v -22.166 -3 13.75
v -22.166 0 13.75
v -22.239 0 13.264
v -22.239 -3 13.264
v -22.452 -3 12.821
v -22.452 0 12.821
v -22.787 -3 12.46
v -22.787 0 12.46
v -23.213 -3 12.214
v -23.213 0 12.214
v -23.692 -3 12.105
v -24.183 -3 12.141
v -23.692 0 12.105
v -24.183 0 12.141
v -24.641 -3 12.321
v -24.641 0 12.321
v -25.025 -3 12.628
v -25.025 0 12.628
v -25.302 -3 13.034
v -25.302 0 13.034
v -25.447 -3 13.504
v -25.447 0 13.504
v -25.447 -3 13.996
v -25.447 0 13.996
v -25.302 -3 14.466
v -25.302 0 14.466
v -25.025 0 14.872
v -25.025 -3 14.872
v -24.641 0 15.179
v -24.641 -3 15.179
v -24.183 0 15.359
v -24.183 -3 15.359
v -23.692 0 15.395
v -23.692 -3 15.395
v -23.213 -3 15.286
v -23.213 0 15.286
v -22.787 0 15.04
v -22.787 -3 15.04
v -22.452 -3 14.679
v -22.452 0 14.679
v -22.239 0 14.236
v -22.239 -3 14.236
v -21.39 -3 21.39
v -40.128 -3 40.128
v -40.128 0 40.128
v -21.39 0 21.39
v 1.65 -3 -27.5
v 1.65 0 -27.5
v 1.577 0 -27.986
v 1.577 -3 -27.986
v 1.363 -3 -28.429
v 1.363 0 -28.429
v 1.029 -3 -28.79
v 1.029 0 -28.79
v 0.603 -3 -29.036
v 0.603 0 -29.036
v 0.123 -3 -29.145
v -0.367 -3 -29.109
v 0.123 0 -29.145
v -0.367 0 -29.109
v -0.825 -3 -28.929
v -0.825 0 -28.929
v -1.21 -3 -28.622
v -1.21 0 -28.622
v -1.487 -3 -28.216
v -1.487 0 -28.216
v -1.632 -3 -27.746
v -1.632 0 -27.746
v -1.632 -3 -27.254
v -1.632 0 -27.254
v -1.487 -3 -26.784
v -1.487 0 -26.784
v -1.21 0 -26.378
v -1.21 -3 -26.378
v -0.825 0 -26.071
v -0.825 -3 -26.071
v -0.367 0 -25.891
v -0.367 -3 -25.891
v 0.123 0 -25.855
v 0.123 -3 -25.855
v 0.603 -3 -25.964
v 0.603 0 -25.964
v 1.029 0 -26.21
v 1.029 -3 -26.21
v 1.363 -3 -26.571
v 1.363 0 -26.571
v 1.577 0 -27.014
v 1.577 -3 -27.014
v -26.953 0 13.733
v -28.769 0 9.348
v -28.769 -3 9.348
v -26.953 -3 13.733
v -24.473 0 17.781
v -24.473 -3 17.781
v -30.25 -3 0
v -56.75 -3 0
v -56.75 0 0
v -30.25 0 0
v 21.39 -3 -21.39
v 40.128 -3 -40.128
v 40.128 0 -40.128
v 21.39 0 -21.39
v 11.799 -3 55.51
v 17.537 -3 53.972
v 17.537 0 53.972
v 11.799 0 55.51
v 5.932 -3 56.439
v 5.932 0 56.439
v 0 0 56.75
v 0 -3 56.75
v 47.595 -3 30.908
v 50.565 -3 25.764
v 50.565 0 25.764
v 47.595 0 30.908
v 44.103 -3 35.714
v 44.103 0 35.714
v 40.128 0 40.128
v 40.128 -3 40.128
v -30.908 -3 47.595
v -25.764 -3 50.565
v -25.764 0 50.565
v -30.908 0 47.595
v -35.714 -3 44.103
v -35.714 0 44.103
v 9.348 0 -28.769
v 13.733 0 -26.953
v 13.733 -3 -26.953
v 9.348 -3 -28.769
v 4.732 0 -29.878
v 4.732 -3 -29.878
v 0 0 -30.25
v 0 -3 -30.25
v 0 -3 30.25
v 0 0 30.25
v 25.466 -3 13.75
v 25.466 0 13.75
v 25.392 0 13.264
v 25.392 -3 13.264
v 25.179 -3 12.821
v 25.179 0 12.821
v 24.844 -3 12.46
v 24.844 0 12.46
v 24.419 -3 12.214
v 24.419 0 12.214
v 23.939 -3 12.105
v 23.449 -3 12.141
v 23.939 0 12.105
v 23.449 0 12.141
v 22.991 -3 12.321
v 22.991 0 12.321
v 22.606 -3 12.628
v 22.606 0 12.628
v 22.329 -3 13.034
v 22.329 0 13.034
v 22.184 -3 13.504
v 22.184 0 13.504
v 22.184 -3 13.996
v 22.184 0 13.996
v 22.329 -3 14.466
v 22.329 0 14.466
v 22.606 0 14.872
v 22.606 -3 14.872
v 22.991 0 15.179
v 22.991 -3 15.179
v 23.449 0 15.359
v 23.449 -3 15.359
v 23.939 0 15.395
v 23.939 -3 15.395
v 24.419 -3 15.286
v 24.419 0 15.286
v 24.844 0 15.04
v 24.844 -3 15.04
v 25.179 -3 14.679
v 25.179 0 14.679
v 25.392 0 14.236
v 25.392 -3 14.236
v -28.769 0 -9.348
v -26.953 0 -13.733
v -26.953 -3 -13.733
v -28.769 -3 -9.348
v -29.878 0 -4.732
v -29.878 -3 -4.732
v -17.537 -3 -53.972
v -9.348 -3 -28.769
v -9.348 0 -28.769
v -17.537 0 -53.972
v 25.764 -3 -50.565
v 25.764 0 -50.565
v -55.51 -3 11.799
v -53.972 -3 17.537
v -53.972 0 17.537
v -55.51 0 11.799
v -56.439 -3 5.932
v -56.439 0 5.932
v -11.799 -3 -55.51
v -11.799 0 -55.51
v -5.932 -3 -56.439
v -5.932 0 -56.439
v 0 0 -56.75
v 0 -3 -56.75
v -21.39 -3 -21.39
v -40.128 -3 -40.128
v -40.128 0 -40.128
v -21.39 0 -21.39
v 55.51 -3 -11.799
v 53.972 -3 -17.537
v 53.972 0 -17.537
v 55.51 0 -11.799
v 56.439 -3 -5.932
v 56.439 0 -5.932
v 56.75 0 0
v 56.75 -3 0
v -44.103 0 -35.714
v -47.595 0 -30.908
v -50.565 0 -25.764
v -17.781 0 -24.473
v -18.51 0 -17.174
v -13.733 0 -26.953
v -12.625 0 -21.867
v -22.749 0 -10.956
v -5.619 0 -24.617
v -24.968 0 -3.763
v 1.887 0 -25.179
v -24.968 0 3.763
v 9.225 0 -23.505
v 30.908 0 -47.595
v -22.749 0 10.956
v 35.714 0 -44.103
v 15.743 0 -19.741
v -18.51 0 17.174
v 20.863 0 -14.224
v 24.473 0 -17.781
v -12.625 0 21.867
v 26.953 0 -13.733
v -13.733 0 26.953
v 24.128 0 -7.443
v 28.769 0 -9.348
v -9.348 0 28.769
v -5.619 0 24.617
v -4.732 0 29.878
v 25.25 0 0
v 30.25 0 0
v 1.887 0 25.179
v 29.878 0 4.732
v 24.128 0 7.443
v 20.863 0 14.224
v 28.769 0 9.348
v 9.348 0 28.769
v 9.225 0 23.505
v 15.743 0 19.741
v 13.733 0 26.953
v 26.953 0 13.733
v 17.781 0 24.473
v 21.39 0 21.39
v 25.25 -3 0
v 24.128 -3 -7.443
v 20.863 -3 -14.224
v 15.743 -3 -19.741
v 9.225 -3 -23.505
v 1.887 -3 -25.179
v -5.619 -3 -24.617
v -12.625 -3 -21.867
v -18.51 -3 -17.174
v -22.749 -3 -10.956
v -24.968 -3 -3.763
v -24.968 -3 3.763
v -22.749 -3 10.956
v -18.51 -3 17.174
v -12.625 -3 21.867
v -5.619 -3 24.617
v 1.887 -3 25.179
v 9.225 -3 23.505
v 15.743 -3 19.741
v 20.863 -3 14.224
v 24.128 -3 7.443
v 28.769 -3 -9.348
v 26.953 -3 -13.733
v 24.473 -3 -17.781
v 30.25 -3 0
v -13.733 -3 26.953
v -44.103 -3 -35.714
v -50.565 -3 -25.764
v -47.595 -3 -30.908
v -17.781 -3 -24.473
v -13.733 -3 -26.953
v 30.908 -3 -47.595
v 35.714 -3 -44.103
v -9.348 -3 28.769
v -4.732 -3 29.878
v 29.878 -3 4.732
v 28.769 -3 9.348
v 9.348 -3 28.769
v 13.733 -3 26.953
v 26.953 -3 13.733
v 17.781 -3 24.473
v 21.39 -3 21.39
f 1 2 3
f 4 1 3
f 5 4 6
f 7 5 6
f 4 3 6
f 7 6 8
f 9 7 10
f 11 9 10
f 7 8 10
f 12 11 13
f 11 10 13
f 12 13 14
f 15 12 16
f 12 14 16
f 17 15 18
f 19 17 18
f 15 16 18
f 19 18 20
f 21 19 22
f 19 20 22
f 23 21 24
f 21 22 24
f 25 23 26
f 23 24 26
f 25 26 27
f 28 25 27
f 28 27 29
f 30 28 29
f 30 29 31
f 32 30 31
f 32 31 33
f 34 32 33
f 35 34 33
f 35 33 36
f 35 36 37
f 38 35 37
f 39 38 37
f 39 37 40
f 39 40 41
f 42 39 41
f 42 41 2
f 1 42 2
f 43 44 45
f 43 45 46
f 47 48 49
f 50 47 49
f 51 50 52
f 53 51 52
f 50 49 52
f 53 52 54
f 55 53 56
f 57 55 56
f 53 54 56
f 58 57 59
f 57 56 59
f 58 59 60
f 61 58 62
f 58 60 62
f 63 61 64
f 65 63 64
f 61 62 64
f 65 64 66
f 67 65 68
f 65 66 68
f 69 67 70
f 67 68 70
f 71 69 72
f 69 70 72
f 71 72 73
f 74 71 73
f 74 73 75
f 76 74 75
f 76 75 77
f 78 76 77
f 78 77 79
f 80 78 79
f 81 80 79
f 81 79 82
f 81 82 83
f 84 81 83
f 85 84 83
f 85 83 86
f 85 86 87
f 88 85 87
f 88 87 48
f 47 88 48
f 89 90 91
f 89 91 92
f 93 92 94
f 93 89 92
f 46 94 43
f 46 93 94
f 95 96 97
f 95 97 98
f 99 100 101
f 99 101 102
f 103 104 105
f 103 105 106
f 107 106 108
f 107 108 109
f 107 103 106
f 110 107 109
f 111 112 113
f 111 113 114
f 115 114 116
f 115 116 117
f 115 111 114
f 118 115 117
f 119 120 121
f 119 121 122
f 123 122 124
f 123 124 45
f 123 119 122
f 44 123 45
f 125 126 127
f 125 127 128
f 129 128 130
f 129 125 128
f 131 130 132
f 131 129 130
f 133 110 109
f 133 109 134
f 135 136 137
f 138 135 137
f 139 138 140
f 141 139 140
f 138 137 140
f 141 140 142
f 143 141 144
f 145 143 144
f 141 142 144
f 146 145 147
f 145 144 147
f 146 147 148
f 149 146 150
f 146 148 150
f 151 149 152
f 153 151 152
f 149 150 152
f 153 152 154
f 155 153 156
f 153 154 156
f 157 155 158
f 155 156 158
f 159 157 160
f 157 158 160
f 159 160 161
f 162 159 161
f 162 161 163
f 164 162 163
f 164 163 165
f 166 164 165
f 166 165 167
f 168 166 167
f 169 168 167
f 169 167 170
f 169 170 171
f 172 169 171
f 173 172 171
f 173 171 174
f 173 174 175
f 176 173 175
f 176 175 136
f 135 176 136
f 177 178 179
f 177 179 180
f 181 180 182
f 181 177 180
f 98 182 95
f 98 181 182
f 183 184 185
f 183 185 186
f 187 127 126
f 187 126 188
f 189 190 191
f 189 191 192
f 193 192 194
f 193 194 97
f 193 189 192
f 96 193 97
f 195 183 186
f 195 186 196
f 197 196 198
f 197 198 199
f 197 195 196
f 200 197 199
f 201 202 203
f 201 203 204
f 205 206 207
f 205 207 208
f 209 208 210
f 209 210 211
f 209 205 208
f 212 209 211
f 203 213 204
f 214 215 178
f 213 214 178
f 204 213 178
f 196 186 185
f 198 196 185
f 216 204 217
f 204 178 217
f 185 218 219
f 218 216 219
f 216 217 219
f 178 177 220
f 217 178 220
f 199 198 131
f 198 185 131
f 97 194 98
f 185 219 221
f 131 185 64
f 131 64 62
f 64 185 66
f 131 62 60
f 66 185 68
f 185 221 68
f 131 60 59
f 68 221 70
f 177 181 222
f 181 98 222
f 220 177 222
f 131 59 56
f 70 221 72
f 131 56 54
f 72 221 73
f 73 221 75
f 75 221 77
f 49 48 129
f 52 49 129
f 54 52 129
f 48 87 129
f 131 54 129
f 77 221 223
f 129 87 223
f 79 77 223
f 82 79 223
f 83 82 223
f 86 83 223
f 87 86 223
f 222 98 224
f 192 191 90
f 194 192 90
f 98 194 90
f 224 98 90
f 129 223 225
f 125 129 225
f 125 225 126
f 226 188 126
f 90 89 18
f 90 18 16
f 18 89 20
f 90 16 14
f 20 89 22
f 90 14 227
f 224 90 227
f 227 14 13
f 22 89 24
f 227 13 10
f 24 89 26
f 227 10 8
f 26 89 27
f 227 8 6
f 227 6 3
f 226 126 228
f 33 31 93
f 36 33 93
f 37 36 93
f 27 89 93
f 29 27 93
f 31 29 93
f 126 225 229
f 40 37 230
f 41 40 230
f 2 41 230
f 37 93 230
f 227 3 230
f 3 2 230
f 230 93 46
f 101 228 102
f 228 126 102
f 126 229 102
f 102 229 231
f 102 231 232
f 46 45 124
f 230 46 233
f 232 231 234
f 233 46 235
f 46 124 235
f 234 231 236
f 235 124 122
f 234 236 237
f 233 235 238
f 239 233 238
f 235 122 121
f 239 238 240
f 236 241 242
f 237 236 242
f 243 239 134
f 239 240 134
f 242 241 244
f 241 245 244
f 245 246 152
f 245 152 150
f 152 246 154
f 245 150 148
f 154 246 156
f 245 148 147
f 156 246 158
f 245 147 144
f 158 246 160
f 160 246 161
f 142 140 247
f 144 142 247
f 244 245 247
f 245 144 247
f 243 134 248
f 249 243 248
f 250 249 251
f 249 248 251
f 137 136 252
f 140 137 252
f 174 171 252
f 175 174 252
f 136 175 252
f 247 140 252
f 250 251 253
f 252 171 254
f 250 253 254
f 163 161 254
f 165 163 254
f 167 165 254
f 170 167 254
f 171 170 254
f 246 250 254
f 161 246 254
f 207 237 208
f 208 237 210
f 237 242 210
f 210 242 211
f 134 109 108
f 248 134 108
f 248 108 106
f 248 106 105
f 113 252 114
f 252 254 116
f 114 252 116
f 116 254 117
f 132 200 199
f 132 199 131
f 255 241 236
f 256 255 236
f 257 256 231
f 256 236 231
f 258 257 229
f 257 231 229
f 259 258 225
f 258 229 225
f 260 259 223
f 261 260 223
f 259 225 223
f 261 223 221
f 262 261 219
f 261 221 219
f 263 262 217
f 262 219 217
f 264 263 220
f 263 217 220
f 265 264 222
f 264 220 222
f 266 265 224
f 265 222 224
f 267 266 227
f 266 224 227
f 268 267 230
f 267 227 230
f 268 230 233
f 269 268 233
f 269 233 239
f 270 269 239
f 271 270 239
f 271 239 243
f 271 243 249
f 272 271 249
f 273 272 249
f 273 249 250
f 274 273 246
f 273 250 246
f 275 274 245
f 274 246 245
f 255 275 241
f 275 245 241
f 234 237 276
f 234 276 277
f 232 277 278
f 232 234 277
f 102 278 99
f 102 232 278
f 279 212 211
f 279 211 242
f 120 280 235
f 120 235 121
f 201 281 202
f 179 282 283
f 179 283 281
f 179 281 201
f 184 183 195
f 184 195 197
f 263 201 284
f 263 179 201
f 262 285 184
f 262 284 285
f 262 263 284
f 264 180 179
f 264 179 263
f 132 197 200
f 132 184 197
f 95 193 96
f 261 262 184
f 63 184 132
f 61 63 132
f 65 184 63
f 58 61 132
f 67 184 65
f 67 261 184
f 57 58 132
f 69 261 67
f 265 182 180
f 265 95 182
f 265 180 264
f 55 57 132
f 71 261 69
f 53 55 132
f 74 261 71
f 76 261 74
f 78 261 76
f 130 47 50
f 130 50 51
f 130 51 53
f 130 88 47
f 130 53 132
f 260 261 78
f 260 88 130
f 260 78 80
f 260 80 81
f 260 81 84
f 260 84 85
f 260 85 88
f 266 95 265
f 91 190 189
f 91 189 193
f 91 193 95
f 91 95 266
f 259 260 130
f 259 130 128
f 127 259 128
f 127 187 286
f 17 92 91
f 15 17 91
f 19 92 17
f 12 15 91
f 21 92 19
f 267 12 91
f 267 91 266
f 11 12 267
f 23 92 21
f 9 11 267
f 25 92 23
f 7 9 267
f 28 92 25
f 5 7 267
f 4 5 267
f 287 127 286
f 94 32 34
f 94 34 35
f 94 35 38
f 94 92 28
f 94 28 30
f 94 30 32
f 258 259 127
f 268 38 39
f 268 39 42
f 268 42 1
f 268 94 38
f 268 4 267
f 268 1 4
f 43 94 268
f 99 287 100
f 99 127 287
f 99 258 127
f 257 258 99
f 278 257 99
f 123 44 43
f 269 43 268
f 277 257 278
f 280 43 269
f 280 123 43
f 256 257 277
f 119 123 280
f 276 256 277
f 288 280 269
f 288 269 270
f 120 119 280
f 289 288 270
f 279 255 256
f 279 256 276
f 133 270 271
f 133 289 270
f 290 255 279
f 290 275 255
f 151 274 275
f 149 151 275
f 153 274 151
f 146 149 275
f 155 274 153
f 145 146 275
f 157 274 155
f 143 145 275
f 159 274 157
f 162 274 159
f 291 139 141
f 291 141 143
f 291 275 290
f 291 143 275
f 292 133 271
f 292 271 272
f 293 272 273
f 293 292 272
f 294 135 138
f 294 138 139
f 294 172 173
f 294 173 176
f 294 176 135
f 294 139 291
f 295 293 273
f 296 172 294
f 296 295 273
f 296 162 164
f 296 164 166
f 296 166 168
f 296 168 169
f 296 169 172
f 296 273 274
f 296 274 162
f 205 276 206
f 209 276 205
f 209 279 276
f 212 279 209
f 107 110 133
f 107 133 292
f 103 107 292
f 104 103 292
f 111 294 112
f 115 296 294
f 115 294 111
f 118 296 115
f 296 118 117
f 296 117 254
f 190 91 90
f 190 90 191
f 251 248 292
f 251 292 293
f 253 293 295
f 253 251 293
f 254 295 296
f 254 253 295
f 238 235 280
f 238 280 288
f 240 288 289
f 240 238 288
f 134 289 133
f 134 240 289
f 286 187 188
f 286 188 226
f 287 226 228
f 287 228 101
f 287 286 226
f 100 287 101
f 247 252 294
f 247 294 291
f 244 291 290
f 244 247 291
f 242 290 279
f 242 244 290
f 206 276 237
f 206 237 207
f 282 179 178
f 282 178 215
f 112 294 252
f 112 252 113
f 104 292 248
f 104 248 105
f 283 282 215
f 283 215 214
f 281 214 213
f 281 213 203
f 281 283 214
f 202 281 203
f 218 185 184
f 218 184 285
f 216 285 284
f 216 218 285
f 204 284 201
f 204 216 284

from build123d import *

# Parameters (mm, degrees)
SKETCH1_R           = 30.25
SKETCH1_R_2         = 25.25
EXTRUDE_THIN1_DEPTH = 3
SKETCH2_R           = 1.65
CUT_EXTRUDE3_DEPTH  = 10
BOSS_EXTRUDE1_DEPTH = 3


with BuildPart() as part:
    # Sketch1 → Extrude-Thin1 (new body)
    with BuildSketch(Plane(origin=(0, 0, 0), x_dir=(1, 0, 0), z_dir=(0, 1, 0))):
        Circle(SKETCH1_R)
        Circle(SKETCH1_R_2, mode=Mode.SUBTRACT)
    extrude(amount=-EXTRUDE_THIN1_DEPTH)

    # Sketch2 → Cut-Extrude3 (cut)
    with BuildSketch(Plane(origin=(0, 0, 0), x_dir=(1, 0, 0), z_dir=(0, 1, 0))):
        with Locations((0, 27.5)):
            Circle(SKETCH2_R)
        with Locations((23.815698604, -13.75)):
            Circle(SKETCH2_R)
        with Locations((-23.815698604, -13.75)):
            Circle(SKETCH2_R)
    extrude(amount=-CUT_EXTRUDE3_DEPTH, mode=Mode.SUBTRACT)

    # Sketch5 → Boss-Extrude1 (add)
    with BuildSketch(Plane.XZ.offset(3)):
        with BuildLine():
            Line((0, 56.75), (0, 30.25))
            ThreePointArc((0, 30.25), (4.732142567, 29.877572303), (9.34776408, 28.769459618))
            Line((9.34776408, 28.769459618), (17.536714431, 53.9724573))
            ThreePointArc((17.536714431, 53.9724573), (8.877655891, 56.051313329), (0, 56.75))
        make_face()
        with BuildLine():
            Line((40.128309832, 40.128309832), (21.389980131, 21.389980131))
            ThreePointArc((21.389980131, 21.389980131), (24.47276408, 17.780503882), (26.952947357, 13.733212617))
            Line((26.952947357, 13.733212617), (50.564620248, 25.76396086))
            ThreePointArc((50.564620248, 25.76396086), (45.911714431, 33.356813068), (40.128309832, 40.128309832))
        make_face()
        with BuildLine():
            Line((56.75, 0), (30.25, 0))
            ThreePointArc((30.25, 0), (29.877572303, -4.732142567), (28.769459618, -9.34776408))
            Line((28.769459618, -9.34776408), (53.9724573, -17.536714431))
            ThreePointArc((53.9724573, -17.536714431), (56.051313329, -8.877655891), (56.75, 0))
        make_face()
        with BuildLine():
            Line((40.128309832, -40.128309832), (21.389980131, -21.389980131))
            ThreePointArc((21.389980131, -21.389980131), (17.780503882, -24.47276408), (13.733212617, -26.952947357))
            Line((13.733212617, -26.952947357), (25.76396086, -50.564620248))
            ThreePointArc((25.76396086, -50.564620248), (33.356813068, -45.911714431), (40.128309832, -40.128309832))
        make_face()
        with BuildLine():
            Line((0, -56.75), (0, -30.25))
            ThreePointArc((0, -30.25), (-4.732142567, -29.877572303), (-9.34776408, -28.769459618))
            Line((-9.34776408, -28.769459618), (-17.536714431, -53.9724573))
            ThreePointArc((-17.536714431, -53.9724573), (-8.877655891, -56.051313329), (0, -56.75))
        make_face()
        with BuildLine():
            Line((-40.128309832, -40.128309832), (-21.389980131, -21.389980131))
            ThreePointArc((-21.389980131, -21.389980131), (-24.47276408, -17.780503882), (-26.952947357, -13.733212617))
            Line((-26.952947357, -13.733212617), (-50.564620248, -25.76396086))
            ThreePointArc((-50.564620248, -25.76396086), (-45.911714431, -33.356813068), (-40.128309832, -40.128309832))
        make_face()
        with BuildLine():
            Line((-56.75, 0), (-30.25, 0))
            ThreePointArc((-30.25, 0), (-29.877572303, 4.732142567), (-28.769459618, 9.34776408))
            Line((-28.769459618, 9.34776408), (-53.9724573, 17.536714431))
            ThreePointArc((-53.9724573, 17.536714431), (-56.051313329, 8.877655891), (-56.75, 0))
        make_face()
        with BuildLine():
            Line((-40.128309832, 40.128309832), (-21.389980131, 21.389980131))
            ThreePointArc((-21.389980131, 21.389980131), (-17.780503882, 24.47276408), (-13.733212617, 26.952947357))
            Line((-13.733212617, 26.952947357), (-25.76396086, 50.564620248))
            ThreePointArc((-25.76396086, 50.564620248), (-33.356813068, 45.911714431), (-40.128309832, 40.128309832))
        make_face()
    extrude(amount=-BOSS_EXTRUDE1_DEPTH)


solid = part.part
